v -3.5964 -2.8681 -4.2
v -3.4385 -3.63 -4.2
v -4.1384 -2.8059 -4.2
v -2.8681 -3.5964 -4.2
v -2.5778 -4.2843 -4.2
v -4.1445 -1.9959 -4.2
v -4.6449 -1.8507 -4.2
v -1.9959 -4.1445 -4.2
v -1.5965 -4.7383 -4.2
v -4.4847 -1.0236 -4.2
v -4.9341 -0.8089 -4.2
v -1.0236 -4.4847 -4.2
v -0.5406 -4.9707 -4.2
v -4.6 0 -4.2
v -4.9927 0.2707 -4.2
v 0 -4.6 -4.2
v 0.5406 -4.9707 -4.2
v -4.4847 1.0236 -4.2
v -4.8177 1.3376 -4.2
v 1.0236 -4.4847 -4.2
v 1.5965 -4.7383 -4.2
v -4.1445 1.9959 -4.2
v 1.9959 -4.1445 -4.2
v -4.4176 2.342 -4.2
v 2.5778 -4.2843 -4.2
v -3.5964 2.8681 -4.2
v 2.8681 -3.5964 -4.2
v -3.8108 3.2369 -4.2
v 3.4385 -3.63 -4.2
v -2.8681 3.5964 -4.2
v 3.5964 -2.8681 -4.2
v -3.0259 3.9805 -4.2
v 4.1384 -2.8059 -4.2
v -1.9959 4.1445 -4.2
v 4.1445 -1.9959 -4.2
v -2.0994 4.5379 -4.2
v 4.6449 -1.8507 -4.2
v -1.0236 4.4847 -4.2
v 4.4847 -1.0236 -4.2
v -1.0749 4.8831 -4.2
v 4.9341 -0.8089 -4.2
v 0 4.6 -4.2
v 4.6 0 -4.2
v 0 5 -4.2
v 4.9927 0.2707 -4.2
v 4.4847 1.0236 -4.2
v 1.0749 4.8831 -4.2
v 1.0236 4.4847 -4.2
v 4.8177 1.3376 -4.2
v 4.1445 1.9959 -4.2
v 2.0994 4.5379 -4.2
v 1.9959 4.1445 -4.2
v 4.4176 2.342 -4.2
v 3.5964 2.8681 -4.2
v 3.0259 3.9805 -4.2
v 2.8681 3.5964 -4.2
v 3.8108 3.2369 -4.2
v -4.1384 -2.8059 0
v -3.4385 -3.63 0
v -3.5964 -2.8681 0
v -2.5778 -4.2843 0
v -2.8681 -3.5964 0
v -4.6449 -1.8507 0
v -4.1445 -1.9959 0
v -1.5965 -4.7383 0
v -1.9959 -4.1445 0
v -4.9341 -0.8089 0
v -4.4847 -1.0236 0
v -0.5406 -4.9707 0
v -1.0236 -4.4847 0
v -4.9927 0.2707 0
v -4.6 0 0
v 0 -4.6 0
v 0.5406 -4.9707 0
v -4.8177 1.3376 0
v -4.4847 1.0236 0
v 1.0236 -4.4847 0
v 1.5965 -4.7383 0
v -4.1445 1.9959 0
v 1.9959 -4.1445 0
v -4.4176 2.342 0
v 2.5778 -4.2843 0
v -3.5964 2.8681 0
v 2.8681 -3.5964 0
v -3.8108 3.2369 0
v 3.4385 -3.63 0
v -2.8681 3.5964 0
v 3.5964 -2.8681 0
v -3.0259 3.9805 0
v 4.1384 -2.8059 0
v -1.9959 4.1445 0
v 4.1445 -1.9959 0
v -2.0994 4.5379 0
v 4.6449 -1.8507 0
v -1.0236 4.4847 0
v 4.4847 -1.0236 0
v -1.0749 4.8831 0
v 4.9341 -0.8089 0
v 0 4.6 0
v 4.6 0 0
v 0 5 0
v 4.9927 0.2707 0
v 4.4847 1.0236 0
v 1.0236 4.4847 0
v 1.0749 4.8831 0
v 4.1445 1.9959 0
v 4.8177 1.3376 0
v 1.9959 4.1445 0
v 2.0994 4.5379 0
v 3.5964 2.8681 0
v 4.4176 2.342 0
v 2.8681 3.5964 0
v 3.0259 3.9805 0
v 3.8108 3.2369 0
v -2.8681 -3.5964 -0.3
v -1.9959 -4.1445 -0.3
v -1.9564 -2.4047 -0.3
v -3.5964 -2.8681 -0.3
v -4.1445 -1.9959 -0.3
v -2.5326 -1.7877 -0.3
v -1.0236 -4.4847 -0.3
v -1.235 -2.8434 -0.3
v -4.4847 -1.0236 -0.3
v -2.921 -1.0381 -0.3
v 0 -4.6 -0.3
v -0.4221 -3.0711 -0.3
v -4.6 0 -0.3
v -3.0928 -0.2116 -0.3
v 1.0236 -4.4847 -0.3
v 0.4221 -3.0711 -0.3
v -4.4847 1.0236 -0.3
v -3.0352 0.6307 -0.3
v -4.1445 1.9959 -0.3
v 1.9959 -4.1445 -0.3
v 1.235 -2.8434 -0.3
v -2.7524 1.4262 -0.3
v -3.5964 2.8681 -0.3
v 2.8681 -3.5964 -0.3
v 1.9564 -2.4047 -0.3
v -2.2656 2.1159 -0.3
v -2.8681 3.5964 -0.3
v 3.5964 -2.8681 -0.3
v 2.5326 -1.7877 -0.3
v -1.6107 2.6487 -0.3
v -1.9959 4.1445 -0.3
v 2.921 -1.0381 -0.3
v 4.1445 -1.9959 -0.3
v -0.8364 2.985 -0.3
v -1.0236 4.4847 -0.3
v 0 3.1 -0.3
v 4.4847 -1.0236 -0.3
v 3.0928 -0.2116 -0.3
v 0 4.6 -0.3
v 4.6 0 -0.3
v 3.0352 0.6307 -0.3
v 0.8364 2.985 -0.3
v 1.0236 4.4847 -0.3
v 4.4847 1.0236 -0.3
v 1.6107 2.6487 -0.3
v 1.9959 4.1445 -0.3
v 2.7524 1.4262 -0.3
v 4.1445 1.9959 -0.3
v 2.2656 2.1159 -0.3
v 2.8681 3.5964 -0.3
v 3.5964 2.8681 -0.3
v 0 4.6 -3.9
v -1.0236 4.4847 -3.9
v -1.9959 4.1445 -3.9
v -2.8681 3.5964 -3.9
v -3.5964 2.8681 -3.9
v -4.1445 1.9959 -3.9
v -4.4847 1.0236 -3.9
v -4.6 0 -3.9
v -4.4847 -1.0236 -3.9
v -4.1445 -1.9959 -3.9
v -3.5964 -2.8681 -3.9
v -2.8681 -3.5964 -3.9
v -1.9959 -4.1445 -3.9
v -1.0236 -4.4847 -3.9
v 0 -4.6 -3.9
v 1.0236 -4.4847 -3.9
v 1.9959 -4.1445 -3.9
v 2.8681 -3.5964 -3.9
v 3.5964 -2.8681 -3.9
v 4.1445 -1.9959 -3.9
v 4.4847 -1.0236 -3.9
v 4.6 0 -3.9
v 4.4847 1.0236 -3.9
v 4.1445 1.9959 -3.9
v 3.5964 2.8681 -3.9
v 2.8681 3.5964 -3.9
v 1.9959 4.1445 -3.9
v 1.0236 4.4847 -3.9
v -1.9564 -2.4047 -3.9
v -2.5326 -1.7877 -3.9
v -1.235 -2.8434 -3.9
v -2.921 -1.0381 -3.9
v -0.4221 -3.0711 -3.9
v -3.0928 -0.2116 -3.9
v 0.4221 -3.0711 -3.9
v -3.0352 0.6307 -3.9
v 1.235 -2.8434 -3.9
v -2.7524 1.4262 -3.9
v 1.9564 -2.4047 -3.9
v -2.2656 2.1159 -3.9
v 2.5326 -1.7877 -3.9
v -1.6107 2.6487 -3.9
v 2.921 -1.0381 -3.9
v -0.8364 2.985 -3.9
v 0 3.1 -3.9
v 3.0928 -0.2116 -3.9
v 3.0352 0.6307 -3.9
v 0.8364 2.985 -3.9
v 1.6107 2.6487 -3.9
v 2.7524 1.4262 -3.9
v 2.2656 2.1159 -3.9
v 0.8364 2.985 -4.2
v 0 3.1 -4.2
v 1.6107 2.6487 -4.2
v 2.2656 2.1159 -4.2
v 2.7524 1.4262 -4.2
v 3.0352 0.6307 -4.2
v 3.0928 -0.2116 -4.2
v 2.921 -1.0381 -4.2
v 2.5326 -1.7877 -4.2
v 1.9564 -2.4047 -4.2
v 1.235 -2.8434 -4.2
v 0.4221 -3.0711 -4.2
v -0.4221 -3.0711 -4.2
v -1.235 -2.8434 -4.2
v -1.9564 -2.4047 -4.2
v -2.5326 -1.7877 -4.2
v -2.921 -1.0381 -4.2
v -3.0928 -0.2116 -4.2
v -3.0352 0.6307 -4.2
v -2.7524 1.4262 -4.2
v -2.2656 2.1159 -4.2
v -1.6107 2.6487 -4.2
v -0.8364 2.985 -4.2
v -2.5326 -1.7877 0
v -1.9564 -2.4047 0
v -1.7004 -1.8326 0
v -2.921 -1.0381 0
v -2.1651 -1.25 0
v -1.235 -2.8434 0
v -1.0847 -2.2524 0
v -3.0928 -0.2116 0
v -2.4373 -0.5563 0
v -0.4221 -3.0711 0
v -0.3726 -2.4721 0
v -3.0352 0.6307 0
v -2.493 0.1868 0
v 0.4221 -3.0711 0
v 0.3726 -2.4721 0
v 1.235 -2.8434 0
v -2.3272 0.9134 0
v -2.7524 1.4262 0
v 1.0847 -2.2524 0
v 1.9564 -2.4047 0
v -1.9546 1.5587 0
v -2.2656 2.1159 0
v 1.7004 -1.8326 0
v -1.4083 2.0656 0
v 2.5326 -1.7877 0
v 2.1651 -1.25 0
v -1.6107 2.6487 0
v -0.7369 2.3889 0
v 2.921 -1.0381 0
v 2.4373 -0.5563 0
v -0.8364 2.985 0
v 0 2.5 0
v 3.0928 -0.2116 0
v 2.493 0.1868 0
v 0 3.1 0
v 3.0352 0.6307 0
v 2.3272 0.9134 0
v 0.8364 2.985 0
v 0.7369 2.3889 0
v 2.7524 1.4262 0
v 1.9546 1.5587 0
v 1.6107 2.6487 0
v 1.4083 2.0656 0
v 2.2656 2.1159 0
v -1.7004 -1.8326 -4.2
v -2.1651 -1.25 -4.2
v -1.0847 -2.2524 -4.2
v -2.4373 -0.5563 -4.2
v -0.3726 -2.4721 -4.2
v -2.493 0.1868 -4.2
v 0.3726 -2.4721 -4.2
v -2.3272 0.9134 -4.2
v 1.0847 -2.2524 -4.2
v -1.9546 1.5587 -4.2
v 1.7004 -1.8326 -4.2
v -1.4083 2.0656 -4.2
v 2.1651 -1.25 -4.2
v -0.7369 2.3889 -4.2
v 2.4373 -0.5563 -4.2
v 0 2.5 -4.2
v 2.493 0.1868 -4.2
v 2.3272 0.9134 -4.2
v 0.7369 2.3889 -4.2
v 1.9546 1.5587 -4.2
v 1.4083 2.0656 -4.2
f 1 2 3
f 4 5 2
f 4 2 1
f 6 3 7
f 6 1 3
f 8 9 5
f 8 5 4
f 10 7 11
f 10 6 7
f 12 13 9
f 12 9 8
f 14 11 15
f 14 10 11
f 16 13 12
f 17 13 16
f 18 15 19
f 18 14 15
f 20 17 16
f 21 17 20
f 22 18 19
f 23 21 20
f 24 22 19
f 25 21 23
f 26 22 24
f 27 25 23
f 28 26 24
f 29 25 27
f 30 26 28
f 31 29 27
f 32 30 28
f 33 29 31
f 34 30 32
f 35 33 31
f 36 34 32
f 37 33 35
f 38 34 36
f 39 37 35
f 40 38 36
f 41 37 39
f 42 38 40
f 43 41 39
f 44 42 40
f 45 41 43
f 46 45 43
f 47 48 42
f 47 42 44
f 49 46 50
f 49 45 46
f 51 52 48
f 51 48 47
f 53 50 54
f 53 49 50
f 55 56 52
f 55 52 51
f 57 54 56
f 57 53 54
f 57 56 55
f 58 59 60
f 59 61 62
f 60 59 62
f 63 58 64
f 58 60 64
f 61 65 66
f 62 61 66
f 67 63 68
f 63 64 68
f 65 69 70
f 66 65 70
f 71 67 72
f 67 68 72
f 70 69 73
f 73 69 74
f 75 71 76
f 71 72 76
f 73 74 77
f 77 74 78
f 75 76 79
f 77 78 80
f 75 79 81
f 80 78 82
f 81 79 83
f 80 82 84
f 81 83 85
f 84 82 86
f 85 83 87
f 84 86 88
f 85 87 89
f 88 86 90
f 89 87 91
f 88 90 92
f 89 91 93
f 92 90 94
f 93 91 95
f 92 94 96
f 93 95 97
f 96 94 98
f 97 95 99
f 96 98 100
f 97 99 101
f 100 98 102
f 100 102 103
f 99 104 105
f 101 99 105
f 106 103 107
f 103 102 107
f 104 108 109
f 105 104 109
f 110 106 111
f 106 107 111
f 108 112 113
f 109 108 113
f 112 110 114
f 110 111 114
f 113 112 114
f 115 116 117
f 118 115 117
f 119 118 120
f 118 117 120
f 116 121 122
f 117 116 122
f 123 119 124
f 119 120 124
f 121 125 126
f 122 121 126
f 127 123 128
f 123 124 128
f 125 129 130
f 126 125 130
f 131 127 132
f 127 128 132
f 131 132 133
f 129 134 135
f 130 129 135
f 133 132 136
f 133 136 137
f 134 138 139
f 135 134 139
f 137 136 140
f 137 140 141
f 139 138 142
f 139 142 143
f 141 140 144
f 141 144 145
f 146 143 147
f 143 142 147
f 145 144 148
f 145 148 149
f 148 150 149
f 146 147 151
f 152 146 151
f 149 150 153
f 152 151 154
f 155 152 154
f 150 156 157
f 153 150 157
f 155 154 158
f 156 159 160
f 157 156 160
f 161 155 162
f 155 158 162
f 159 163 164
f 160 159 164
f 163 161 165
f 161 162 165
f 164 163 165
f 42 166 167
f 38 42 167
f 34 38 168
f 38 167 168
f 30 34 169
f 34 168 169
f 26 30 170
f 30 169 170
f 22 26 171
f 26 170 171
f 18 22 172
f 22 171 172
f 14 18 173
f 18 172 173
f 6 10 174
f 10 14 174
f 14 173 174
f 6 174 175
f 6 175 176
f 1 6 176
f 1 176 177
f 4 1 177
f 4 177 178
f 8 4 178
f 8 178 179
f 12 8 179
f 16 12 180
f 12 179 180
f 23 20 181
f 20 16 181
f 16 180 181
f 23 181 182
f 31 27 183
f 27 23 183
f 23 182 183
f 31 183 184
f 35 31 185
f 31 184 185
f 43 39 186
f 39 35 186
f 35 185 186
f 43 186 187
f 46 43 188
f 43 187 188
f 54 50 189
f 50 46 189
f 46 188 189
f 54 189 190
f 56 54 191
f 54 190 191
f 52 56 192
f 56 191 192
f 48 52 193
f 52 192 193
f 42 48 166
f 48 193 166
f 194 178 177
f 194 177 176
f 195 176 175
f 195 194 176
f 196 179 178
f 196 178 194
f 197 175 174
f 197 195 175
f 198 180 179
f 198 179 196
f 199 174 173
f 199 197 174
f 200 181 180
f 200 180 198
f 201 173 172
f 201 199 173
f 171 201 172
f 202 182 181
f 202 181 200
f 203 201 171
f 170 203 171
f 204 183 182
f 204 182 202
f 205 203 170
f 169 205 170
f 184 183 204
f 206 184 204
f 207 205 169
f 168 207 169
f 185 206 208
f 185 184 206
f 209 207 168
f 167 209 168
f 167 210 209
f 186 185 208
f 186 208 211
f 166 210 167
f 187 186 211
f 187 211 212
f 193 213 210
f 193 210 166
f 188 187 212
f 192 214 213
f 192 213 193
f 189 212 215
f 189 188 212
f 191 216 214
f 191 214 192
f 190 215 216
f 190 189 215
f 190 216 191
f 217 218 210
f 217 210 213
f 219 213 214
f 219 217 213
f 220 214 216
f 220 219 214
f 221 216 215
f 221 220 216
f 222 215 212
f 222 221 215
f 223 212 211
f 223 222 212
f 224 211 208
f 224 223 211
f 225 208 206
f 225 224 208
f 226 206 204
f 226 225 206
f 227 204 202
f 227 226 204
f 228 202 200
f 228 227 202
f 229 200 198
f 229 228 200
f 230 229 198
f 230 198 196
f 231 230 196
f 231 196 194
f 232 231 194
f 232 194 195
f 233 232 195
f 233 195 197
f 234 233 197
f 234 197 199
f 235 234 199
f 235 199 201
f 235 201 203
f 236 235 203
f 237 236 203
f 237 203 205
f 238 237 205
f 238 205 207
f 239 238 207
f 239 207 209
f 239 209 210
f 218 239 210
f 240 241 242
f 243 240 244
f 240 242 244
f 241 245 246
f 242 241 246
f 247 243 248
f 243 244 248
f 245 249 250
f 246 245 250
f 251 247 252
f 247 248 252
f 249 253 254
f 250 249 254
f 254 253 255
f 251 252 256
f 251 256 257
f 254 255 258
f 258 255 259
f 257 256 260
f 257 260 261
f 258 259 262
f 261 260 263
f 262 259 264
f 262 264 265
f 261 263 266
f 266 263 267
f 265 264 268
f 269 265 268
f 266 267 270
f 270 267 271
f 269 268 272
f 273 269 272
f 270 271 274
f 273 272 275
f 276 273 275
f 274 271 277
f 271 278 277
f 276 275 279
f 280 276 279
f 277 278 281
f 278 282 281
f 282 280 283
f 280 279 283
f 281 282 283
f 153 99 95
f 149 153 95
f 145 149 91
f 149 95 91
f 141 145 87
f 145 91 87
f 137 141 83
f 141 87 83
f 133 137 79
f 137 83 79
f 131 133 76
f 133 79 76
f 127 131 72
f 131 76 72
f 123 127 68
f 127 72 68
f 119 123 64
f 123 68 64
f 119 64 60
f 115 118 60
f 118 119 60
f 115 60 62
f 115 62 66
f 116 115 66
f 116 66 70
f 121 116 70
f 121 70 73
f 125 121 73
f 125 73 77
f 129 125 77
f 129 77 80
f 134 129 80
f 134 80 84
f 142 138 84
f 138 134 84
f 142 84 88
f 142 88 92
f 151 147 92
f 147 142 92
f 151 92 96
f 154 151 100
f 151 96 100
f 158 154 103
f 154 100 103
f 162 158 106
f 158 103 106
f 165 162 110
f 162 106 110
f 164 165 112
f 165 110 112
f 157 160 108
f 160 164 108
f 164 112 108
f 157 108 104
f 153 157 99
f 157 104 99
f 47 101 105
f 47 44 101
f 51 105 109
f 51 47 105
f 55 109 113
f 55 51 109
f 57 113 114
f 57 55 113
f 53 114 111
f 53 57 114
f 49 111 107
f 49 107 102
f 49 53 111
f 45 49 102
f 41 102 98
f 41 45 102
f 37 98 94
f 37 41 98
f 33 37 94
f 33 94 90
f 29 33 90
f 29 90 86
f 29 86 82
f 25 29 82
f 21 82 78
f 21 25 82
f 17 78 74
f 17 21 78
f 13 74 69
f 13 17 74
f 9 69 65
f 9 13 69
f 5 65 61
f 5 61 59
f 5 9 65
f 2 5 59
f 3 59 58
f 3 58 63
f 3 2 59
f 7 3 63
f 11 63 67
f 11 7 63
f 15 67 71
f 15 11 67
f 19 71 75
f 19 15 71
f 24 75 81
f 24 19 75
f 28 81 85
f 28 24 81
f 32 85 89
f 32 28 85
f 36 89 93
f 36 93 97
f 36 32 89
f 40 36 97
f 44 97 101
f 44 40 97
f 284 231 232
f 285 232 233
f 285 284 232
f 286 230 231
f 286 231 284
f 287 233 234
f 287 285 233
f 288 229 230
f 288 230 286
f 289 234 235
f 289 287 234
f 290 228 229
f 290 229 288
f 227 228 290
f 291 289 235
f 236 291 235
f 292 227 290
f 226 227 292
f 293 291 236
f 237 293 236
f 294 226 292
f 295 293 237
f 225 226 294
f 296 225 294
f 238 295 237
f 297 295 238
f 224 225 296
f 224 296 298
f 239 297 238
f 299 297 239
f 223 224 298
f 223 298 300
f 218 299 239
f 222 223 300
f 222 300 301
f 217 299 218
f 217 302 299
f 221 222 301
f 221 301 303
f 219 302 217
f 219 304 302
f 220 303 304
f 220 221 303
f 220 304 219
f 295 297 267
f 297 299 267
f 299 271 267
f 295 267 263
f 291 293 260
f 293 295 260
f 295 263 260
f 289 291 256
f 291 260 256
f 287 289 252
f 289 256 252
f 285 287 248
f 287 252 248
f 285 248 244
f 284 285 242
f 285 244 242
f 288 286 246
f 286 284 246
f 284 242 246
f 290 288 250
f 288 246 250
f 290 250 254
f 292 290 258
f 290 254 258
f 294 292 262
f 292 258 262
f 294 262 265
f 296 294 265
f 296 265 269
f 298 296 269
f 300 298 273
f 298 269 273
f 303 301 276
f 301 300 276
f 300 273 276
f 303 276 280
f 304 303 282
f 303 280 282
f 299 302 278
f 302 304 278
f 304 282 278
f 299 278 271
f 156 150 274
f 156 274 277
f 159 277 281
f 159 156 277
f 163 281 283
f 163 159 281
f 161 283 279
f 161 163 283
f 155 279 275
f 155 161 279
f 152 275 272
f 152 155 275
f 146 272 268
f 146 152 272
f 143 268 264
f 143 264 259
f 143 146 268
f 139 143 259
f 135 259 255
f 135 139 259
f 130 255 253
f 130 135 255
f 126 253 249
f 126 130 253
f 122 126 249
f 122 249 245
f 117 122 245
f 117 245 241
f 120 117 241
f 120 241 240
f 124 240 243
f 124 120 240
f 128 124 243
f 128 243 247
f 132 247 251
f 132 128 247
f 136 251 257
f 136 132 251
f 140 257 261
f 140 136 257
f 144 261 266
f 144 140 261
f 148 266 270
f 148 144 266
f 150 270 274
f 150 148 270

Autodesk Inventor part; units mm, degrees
ref_plane "YZ Plane" through (0, 0, 0) normal (1, 0, 0) x (0, 1, 0)
ref_plane "XZ Plane" through (0, 0, 0) normal (0, 1, 0) x (-1, 0, 0)
ref_plane "XY Plane" through (0, 0, 0) normal (0, 0, 1) x (1, 0, 0)
sketch "Sketch1" plane through (0, 0, 0) normal (1, 0, 0) x (0, 1, 0)
  line L0 (4, 0) -> (2.5, 0)
  line L1 (2.5, 0) -> (3.1, 0)
  line L2 (3.1, 0) -> (3.1, -0.3)
  line L3 (3.1, -0.3) -> (4.6, -0.3)
  line L4 (4.6, -0.3) -> (4.6, 0)
  line L5 (4.6, 0) -> (5, 0)
  line L6 (5, 0) -> (5, -4.2)
  line L7 (5, -4.2) -> (4.6, -4.2)
  line L8 (4.6, -4.2) -> (4.6, -3.9)
  line L9 (4.6, -3.9) -> (3.1, -3.9)
  line L10 (3.1, -3.9) -> (3.1, -4.2)
  line L11 (3.1, -4.2) -> (2.5, -4.2)
  line L12 (2.5, -4.2) -> (2.5, 0)
  line L13 (0, 0) -> (0, -4.97)
revolve "Revolution1" add sketch "Sketch1" angle 360 about axis through (0, 0, 0) along (0, 0, -1)
properties part number "Ball Bearing 5 x 10 x 4.2" material "Stainless Steel"
